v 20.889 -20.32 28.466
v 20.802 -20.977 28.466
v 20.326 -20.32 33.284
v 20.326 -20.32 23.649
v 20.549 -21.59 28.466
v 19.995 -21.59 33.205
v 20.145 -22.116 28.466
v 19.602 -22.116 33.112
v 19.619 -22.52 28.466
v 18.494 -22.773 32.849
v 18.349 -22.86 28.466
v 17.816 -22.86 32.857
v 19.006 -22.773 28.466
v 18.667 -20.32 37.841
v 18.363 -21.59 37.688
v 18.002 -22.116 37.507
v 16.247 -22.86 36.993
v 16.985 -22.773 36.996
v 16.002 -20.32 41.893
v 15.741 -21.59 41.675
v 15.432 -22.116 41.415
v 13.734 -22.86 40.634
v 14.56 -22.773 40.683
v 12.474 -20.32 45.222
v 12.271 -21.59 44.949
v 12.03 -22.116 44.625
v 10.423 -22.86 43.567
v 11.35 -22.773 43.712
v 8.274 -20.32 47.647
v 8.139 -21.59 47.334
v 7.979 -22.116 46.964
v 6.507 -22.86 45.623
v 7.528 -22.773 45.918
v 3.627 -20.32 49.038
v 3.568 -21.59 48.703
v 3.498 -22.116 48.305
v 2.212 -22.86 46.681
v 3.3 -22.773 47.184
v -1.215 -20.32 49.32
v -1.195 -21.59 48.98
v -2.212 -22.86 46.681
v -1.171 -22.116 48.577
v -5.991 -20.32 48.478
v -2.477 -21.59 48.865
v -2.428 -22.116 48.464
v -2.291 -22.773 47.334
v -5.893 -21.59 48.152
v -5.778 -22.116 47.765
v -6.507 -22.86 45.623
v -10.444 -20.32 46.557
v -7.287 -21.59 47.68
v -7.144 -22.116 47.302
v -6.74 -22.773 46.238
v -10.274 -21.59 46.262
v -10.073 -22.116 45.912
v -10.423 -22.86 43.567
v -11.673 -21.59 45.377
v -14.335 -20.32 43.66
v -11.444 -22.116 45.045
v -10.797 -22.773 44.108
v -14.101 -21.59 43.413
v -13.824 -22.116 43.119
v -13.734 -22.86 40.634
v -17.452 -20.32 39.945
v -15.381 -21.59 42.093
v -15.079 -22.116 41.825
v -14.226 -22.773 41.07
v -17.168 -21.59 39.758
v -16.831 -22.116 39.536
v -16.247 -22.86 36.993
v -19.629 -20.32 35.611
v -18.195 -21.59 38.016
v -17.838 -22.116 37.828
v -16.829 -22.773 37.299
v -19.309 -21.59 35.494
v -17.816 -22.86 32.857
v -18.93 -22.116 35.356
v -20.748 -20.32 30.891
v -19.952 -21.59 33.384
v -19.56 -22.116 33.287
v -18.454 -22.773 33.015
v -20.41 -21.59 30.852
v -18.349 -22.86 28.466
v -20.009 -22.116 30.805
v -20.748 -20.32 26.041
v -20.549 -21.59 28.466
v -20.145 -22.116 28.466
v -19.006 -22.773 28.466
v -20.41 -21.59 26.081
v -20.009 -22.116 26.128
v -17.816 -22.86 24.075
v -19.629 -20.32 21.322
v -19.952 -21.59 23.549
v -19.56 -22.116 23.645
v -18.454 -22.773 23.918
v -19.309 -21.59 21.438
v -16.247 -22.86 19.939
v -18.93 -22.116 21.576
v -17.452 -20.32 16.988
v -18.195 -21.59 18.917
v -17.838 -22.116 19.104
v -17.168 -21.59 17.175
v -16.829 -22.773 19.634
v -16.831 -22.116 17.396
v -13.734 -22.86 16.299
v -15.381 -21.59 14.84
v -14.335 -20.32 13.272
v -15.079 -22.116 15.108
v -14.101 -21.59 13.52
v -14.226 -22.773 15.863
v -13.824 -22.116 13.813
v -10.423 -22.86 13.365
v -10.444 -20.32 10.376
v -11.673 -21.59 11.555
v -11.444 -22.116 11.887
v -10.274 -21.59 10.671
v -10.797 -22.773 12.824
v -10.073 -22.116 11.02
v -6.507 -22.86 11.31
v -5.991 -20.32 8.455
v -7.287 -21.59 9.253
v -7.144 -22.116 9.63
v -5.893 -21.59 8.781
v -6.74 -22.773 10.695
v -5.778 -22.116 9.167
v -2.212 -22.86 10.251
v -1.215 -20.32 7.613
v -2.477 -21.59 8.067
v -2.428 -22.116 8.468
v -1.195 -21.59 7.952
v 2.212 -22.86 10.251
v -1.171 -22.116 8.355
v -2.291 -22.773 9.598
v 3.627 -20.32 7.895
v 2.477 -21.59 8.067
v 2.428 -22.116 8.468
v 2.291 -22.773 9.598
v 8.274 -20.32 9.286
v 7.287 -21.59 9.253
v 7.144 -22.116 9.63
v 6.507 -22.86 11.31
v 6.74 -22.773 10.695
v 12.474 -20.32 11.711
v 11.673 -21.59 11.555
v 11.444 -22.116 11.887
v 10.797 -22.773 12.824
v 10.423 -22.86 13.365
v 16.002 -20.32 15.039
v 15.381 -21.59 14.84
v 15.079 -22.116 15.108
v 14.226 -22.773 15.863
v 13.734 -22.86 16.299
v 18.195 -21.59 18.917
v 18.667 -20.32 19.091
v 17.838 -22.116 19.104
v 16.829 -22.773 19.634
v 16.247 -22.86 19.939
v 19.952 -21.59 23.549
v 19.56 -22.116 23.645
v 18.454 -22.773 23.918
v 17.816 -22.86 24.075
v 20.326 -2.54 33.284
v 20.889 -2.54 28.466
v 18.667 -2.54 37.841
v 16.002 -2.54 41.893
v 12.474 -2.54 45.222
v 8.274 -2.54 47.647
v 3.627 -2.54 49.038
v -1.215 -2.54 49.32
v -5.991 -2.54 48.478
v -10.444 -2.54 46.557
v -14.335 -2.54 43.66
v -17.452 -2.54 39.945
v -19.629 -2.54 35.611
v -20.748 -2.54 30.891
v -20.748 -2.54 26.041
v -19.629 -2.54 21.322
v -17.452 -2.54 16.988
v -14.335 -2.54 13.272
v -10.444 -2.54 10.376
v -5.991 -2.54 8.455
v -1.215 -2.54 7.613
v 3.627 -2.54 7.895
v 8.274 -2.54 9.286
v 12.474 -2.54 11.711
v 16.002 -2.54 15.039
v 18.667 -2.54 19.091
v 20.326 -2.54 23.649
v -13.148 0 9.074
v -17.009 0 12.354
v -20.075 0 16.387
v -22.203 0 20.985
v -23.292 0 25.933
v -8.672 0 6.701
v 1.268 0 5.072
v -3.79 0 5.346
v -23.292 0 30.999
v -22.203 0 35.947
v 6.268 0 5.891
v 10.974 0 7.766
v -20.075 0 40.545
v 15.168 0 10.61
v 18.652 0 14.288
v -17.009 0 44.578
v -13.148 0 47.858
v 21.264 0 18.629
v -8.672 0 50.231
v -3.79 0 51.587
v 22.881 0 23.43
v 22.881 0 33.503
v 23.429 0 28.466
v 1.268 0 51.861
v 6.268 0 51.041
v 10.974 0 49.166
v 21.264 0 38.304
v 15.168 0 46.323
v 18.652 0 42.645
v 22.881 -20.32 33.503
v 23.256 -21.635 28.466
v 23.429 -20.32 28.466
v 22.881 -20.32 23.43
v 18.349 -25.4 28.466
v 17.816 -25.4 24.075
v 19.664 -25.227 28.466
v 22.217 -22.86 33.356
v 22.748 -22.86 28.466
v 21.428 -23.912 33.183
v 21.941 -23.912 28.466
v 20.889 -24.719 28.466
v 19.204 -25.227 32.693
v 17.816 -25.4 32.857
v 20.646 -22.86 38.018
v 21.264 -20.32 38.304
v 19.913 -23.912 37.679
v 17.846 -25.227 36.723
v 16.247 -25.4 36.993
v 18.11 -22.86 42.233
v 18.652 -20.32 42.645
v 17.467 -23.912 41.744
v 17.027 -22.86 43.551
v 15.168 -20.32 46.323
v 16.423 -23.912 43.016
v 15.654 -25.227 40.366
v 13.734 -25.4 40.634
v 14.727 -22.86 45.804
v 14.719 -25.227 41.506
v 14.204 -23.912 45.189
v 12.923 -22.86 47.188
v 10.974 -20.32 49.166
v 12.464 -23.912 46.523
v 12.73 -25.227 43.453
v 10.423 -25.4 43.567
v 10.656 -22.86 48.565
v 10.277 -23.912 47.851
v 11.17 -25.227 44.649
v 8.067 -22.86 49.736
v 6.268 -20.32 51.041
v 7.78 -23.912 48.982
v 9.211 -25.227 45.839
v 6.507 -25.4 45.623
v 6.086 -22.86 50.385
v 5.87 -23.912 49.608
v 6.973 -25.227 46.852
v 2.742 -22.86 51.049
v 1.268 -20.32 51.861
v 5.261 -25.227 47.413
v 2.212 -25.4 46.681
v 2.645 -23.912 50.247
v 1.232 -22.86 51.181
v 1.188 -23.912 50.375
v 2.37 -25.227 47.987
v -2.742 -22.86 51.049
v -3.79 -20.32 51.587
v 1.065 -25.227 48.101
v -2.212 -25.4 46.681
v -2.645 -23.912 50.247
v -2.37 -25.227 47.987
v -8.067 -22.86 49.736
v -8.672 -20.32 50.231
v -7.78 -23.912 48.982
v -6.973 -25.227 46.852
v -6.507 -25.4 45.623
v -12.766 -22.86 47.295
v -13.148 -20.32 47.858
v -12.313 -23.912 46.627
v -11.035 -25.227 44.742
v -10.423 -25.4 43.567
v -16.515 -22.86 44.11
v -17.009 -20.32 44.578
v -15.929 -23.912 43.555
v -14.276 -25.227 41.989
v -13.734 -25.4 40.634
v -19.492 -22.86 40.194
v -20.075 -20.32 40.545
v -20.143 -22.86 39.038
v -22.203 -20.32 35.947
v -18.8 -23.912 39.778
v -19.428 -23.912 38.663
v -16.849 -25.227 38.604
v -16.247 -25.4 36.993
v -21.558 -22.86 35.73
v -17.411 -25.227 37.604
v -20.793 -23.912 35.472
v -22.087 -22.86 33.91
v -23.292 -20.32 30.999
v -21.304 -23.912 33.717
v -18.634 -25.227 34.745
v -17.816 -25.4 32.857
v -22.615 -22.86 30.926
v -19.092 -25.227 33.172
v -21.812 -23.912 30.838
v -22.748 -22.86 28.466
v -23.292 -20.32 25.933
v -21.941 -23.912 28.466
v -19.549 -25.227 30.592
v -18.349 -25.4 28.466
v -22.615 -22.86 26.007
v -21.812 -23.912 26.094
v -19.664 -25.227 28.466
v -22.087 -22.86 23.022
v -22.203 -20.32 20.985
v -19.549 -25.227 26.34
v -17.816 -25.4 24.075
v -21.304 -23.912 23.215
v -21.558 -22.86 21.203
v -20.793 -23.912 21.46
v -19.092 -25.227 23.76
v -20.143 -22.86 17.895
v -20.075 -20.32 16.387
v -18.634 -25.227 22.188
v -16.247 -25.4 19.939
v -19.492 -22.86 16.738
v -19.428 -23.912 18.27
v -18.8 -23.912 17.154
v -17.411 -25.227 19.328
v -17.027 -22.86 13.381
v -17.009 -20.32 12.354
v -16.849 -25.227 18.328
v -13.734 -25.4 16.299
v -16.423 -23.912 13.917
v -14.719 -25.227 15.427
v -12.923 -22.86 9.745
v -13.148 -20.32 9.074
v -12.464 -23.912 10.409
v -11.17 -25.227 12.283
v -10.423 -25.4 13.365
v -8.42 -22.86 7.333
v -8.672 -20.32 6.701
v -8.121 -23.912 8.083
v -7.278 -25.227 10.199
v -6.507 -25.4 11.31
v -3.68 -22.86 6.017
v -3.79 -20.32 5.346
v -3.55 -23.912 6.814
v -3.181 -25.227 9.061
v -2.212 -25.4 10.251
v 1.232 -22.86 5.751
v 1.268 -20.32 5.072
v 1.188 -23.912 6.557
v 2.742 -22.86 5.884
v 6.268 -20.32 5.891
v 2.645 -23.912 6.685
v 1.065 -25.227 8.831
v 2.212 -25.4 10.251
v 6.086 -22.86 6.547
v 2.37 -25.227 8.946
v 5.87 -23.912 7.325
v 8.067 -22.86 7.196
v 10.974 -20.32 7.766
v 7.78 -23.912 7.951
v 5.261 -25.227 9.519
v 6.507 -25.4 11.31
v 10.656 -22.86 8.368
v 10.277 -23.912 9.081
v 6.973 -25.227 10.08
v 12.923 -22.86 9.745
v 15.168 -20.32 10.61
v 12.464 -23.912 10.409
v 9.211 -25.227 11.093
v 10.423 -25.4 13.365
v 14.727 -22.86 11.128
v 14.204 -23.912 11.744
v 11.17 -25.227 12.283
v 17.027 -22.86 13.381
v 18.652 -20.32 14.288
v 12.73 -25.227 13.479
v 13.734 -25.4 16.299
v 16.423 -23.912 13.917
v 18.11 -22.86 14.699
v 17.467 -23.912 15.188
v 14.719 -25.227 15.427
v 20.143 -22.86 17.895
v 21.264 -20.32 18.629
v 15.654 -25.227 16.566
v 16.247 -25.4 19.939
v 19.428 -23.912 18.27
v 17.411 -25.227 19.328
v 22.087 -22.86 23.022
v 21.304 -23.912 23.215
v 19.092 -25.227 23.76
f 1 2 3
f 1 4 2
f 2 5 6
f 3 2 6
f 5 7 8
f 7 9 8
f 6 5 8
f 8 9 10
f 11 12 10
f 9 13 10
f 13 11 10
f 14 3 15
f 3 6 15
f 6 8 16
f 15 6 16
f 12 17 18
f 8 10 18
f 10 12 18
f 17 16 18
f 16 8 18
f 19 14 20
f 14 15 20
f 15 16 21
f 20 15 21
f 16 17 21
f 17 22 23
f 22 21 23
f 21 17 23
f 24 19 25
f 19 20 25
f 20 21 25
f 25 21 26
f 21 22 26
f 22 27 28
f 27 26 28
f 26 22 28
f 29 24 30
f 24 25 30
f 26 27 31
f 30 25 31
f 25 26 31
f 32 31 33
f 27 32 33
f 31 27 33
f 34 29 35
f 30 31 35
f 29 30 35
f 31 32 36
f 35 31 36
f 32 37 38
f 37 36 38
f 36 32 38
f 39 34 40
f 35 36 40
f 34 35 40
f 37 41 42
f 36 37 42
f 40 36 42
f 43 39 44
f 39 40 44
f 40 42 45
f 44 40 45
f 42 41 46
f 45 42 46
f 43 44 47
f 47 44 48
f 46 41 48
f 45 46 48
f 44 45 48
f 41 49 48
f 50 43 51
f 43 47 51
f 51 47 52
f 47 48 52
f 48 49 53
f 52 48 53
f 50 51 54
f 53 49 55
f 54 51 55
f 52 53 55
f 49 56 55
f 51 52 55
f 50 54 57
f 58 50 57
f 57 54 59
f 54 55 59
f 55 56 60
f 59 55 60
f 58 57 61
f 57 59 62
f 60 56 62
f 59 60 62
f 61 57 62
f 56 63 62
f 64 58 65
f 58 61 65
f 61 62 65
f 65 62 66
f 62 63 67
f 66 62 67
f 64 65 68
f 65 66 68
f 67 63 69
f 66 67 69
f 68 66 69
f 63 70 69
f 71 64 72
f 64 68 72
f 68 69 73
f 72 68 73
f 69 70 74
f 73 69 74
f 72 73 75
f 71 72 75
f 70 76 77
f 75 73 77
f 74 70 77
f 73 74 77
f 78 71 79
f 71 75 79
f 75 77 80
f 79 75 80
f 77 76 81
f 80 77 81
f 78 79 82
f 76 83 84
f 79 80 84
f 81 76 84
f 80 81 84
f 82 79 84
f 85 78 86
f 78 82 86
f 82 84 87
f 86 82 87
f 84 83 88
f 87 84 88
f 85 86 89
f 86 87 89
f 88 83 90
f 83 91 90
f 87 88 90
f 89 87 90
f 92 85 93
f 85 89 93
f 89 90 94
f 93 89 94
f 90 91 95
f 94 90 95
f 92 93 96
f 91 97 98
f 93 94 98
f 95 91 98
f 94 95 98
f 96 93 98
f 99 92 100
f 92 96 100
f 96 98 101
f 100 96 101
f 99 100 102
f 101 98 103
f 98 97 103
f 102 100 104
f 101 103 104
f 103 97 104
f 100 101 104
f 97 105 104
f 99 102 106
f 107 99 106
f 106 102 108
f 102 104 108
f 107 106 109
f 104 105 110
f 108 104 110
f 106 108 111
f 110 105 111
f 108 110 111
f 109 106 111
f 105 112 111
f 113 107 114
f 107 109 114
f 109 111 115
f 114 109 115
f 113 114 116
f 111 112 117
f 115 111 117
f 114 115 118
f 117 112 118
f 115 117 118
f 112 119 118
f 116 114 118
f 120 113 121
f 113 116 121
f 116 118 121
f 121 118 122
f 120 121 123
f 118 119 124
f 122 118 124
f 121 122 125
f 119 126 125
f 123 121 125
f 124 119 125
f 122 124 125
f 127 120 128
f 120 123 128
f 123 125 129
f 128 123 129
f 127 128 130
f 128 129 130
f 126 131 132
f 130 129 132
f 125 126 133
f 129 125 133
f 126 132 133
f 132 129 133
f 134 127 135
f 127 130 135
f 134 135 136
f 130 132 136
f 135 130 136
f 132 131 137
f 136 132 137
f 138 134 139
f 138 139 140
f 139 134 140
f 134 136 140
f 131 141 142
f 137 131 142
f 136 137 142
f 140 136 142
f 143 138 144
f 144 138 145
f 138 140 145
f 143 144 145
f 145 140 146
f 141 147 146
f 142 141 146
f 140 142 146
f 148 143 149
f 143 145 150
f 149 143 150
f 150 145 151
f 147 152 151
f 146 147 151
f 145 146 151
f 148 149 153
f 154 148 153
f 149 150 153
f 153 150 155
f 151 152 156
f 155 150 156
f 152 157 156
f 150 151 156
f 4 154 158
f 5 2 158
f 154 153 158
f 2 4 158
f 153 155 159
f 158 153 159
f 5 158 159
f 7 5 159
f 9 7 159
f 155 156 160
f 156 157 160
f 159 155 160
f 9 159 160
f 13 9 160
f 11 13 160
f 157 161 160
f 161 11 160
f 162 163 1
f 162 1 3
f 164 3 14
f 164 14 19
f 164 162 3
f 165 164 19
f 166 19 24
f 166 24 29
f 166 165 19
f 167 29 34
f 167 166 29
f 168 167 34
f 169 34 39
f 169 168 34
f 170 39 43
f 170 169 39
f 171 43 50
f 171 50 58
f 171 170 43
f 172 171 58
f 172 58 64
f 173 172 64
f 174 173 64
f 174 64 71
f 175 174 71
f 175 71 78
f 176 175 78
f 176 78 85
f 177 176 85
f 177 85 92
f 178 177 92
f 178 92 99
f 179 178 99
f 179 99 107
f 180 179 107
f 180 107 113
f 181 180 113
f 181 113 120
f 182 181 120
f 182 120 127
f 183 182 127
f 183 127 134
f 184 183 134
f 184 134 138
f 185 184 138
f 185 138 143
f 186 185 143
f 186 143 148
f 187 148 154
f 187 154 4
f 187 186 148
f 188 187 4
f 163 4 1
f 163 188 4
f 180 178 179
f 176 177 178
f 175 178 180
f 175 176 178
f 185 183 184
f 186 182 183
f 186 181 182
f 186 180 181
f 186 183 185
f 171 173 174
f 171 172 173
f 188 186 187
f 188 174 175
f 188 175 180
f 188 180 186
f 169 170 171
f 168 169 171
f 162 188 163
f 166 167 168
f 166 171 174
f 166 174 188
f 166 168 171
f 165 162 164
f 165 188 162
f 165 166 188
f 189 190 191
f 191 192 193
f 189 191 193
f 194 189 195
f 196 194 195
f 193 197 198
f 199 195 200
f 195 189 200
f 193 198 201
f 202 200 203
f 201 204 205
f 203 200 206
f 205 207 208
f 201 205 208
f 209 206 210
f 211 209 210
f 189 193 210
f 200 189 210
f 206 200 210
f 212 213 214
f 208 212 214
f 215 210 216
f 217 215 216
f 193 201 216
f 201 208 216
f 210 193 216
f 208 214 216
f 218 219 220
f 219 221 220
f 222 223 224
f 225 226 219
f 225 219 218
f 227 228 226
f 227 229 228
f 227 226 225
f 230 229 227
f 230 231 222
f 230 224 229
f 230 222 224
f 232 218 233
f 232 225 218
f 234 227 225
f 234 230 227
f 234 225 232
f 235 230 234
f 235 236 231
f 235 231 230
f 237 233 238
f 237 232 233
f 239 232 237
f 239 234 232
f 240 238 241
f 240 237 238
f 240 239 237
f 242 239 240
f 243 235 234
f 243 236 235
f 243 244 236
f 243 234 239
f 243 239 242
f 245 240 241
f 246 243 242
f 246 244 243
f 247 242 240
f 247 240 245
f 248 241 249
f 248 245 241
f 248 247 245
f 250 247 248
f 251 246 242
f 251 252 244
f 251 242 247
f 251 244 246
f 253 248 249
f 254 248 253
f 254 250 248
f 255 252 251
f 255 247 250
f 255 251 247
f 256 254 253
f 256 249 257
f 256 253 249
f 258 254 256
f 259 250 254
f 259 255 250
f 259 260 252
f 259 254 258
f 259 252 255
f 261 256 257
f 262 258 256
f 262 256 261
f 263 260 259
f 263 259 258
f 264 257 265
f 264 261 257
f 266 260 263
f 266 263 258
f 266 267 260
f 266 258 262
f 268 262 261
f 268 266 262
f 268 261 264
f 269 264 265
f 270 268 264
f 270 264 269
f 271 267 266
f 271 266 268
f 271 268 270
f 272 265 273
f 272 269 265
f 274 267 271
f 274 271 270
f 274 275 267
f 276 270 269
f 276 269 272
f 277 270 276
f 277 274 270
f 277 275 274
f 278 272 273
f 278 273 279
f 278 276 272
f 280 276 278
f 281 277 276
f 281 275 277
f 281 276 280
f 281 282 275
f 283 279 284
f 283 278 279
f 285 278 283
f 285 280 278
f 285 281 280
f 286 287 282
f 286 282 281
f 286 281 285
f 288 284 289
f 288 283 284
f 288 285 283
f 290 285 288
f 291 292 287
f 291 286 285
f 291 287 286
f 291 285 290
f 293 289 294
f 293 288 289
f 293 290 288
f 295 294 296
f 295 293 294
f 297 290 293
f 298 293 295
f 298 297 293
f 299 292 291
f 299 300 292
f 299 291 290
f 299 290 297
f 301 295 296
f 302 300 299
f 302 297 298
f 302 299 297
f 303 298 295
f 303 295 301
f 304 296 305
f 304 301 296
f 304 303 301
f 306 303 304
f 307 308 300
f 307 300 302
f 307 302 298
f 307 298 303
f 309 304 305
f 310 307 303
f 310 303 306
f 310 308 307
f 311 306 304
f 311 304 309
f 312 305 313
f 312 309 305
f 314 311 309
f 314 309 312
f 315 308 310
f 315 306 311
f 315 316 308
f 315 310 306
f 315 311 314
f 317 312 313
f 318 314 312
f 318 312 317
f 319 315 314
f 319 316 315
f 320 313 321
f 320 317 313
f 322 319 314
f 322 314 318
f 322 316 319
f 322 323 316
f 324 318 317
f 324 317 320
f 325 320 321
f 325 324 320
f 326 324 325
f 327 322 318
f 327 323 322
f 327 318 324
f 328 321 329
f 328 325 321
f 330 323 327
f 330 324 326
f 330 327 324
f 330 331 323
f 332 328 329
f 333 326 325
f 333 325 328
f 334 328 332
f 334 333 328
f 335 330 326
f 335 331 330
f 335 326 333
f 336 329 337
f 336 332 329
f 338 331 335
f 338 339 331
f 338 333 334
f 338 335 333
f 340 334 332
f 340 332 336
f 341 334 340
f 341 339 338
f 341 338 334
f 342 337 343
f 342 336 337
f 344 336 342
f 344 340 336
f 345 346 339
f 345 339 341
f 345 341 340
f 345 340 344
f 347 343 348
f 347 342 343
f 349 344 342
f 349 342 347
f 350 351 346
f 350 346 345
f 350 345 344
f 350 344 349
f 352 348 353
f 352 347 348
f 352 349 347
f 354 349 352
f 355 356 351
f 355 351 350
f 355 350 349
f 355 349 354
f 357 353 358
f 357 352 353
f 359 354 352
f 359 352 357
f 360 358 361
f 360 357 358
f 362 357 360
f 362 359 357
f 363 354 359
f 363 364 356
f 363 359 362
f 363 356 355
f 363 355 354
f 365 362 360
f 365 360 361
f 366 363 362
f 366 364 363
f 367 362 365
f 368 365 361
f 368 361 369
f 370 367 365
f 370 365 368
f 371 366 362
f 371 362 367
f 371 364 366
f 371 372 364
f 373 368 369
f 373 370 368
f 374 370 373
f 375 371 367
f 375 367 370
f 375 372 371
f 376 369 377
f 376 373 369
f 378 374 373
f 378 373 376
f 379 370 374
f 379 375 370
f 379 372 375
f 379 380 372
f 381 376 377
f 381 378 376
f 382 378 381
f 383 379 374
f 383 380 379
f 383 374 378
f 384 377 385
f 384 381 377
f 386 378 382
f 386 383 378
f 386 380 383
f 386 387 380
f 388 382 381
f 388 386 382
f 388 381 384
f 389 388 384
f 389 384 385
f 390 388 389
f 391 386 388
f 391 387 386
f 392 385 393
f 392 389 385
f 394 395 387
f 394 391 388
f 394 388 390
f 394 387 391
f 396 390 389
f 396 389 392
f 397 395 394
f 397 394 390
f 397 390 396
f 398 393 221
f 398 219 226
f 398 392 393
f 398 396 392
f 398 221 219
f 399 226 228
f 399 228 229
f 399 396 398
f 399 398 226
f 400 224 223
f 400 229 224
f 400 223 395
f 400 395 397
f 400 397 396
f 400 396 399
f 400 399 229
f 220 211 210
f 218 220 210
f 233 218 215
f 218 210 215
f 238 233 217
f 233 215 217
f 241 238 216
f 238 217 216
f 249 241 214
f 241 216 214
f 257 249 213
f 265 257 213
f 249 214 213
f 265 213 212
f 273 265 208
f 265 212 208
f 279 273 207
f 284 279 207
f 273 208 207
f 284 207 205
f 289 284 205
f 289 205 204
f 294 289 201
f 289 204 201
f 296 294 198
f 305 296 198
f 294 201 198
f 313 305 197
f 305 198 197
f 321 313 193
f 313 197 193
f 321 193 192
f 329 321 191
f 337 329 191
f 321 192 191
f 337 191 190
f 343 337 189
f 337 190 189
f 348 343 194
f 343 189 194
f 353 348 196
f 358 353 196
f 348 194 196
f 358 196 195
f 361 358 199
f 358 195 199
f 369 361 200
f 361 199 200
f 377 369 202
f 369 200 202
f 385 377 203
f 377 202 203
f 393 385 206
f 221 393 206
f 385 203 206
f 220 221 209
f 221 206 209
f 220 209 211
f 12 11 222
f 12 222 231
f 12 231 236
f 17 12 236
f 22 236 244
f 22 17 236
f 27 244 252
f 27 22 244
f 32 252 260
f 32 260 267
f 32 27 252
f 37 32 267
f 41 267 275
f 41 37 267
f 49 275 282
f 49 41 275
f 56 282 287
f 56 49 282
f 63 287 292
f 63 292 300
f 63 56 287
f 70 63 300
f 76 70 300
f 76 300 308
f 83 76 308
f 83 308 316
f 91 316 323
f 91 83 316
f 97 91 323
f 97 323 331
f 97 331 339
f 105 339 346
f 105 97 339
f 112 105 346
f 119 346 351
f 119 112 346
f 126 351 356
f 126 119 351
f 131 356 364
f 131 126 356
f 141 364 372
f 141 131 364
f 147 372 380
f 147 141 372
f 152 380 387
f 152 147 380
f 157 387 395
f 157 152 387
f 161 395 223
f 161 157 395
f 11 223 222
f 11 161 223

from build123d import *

# Parameters (mm, degrees)
F2_R     = 23.428989388
F3_DEPTH = 25.4
F4_R     = 5.08
F5_T     = -2.54


# Not quite as in the source:
# - a shell that OpenCascade refuses in one call is made with other operations: the cavity is built on its own and cut out
# - the program builds the solid bodies; features that only make, move or delete a surface that nothing else refers to are left out


with BuildPart() as f3:
    # F2 (on Front) → F3 (new body)
    with BuildSketch(Plane.XZ):
        with Locations((0, 28.4662228078)):
            Circle(F2_R)
    extrude(amount=F3_DEPTH)

    # F4
    f4_edges = [f3.edges().sort_by_distance(p)[0] for p in [
        (-23.428989, -25.4, 28.466223),
    ]]
    fillet(f4_edges, radius=F4_R)

    # F5: a shell. OpenCascade refuses it in one call, so the cavity is built on its own and cut out:
    # the body offset inwards by the wall thickness, plus a prism from it out through each open face.
    f5_core = offset(f3.part, amount=F5_T, mode=Mode.PRIVATE)
    f5_exits = [f5_core.faces().sort_by_distance(p)[0] for p in [
        (0, -22.86, 28.466223),
    ]]
    add(f5_core, mode=Mode.SUBTRACT)
    extrude(f5_exits, amount=-F5_T, mode=Mode.SUBTRACT)


solid = f3.part
